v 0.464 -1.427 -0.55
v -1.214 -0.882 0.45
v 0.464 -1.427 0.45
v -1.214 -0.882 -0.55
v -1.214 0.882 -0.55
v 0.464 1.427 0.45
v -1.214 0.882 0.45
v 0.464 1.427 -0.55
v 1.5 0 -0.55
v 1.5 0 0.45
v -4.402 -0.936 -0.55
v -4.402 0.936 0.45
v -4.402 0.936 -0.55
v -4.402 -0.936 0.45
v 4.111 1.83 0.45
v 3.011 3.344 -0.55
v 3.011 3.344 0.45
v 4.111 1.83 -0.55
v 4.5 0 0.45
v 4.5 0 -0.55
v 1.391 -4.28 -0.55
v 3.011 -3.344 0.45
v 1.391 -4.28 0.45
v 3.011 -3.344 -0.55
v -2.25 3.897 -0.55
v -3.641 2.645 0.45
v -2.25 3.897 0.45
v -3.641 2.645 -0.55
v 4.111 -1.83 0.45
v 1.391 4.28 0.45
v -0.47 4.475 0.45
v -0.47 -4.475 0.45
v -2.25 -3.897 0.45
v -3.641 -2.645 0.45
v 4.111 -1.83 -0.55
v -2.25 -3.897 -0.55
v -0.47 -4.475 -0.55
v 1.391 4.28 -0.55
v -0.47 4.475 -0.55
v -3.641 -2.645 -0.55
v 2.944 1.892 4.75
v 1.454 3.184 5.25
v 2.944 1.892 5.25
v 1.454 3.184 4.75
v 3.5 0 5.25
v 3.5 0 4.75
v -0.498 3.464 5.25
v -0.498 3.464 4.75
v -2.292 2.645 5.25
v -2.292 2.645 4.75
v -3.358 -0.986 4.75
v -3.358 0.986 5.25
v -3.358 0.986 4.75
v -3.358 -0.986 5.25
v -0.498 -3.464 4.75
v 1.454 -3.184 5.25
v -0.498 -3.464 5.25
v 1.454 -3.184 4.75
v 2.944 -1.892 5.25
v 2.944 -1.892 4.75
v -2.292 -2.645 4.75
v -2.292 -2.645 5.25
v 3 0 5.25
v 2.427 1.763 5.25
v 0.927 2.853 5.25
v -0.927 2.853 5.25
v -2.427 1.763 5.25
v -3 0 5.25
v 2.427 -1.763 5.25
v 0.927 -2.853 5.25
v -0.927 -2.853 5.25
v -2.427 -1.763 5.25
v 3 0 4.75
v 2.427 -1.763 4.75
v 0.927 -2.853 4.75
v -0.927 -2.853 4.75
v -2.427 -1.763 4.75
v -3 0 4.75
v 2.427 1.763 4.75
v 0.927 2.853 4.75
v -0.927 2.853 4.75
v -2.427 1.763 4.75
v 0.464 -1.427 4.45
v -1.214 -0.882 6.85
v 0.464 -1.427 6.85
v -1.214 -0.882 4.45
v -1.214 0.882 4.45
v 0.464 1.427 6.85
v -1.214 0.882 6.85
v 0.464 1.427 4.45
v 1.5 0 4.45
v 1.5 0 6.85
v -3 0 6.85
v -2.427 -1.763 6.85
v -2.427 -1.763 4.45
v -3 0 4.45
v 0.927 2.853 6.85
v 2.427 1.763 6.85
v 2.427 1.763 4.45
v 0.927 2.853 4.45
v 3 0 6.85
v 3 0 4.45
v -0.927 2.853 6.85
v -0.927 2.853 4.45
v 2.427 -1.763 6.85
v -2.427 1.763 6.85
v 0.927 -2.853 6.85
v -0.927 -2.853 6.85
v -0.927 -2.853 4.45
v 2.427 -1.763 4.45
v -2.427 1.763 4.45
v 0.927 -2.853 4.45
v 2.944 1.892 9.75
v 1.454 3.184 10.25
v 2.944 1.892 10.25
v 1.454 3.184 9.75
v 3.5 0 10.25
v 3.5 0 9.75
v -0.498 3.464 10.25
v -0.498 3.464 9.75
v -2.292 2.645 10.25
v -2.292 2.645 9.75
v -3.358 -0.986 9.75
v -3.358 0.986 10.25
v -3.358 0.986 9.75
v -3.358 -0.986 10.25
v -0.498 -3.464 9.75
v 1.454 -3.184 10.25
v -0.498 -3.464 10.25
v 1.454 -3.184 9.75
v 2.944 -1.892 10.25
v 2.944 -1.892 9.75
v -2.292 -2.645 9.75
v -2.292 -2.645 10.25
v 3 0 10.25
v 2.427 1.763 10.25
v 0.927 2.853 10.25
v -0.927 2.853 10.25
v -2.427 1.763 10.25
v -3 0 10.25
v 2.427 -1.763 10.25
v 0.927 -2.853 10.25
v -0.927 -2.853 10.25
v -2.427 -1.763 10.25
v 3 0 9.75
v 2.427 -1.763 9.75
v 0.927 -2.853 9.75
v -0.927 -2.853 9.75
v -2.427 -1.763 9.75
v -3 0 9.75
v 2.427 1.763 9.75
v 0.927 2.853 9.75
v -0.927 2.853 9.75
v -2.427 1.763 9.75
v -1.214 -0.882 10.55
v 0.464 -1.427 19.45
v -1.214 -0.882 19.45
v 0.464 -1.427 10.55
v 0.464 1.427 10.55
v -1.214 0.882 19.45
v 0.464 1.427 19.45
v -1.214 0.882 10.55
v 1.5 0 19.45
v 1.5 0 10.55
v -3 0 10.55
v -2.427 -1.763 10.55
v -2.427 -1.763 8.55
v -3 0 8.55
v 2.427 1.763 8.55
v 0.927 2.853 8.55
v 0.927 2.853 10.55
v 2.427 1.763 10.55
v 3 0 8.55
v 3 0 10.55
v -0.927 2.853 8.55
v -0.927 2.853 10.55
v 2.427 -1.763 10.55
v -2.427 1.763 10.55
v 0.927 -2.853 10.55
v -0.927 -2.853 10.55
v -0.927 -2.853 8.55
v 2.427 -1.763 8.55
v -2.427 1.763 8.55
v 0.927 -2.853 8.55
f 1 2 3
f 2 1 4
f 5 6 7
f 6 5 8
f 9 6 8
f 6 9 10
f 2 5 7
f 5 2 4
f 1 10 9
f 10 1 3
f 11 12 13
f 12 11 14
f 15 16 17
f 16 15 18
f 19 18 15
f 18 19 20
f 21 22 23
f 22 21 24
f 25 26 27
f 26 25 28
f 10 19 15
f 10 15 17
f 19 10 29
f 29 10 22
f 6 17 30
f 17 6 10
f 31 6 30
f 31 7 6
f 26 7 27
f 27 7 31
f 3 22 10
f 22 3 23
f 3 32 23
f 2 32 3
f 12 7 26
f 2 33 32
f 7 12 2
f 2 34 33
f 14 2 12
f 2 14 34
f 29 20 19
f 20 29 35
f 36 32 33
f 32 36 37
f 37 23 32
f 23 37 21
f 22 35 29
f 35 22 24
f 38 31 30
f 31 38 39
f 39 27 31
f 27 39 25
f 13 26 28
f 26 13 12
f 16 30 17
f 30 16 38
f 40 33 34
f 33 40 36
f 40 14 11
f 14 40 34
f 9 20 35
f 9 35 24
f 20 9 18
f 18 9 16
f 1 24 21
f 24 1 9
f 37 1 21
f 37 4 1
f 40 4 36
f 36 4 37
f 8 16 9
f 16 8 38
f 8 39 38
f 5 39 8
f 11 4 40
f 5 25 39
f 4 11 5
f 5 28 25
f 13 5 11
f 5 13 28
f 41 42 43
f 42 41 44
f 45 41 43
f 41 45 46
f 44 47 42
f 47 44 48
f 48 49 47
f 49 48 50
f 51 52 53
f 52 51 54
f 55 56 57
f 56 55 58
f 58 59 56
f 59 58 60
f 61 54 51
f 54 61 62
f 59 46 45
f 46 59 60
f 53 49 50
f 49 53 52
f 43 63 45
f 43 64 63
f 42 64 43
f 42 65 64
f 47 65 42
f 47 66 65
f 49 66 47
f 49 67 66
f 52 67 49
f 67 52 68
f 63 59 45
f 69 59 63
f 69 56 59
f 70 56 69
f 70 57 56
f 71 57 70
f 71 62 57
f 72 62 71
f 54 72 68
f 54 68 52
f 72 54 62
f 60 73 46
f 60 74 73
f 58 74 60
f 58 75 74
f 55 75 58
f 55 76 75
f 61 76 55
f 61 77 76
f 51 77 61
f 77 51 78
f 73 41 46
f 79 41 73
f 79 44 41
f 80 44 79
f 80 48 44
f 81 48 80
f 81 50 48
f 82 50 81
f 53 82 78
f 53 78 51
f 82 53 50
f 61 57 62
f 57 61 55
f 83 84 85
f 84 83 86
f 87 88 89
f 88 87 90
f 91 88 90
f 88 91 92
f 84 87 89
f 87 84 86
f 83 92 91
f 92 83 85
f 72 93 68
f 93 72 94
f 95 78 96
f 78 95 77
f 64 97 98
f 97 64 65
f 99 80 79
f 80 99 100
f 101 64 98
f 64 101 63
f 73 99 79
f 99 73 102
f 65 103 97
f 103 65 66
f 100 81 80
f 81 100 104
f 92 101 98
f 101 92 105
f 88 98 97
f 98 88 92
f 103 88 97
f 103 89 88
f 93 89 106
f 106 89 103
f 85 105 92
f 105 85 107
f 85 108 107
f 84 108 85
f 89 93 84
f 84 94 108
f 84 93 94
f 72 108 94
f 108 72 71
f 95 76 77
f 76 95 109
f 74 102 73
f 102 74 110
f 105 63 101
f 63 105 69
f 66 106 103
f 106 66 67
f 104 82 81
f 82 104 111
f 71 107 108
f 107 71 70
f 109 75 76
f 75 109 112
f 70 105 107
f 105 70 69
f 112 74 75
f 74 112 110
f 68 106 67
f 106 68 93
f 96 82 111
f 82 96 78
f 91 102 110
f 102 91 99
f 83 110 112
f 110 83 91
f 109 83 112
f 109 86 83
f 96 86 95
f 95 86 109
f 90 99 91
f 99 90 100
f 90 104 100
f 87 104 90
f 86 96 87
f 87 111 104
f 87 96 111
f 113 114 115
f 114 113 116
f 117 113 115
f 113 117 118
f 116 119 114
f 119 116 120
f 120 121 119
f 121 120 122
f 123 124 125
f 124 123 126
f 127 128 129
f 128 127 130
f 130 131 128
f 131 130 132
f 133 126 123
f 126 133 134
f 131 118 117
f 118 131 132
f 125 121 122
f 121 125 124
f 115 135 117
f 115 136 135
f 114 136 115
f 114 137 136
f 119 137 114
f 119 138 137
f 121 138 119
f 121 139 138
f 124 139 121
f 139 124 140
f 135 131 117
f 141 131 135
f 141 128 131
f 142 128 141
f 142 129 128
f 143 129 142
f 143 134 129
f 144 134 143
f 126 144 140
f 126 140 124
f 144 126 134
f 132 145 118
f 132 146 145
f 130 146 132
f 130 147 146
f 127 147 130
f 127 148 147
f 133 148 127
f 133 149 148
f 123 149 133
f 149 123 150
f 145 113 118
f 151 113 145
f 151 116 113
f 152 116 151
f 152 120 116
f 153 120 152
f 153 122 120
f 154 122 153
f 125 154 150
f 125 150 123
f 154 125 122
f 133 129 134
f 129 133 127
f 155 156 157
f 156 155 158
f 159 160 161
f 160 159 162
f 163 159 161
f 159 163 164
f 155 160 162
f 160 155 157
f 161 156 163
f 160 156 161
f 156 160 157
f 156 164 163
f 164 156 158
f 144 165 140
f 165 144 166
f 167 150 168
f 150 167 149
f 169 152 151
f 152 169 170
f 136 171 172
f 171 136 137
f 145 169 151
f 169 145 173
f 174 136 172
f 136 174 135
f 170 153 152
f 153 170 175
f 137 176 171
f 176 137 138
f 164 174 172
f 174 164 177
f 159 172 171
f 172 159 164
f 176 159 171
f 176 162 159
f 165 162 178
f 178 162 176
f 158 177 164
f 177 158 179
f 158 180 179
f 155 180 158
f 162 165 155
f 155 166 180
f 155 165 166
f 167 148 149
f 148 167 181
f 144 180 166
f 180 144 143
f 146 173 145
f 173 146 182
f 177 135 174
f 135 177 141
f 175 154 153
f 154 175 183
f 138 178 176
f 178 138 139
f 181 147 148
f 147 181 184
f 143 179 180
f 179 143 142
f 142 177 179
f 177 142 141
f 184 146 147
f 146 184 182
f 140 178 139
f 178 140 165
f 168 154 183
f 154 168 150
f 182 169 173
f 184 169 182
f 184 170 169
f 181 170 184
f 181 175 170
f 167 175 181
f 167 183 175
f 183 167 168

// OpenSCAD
// Parameters
inner_diameter_mm = 3.0; //[1.5:6.0:0.1]
outer_diameter_mm = 7.0; //[3.5:14.0:0.1]
thickness_mm = 0.5; //[0.25:1.0:0.05]
inner_radius_mm = 1.5; //[0.75:3.0:0.05]
outer_radius_mm = 3.5; //[1.75:7.0:0.05]
overlap_mm = 0.8; //[0.5:2.0:0.1]
grommet_top_extra_radius_mm = 1.0; //[0.5:3.0:0.1]
grommet_top_height_mm = 1.0; //[0.5:4.0:0.1]
nut_flat_width_mm = 6.0; //[3.0:12.0:0.1]
nut_thickness_mm = 2.4; //[1.2:5.0:0.1]
screw_shank_diameter_mm = 3.0; //[1.5:6.0:0.1]
screw_shank_length_mm = 10.0; //[5.0:30.0:0.5]
screw_head_diameter_mm = 6.0; //[3.0:12.0:0.1]
screw_head_height_mm = 2.0; //[1.0:5.0:0.1]

// Washer - base geometry
module washer_body() {
  color("Silver") difference() {
    cylinder(r=outer_diameter_mm/2, h=thickness_mm, center=true);
    translate([0, 0, 0])
      cylinder(r=inner_diameter_mm/2, h=thickness_mm + 2*overlap_mm, center=true);
  }
}

// Round Grommet Top
module round_grommet_top() {
  color("DimGray") difference() {
    translate([0, 0, thickness_mm/2 + grommet_top_height_mm/2 - overlap_mm])
      cylinder(r=outer_diameter_mm/2 + grommet_top_extra_radius_mm, h=grommet_top_height_mm, center=true);
    translate([0, 0, thickness_mm/2 + grommet_top_height_mm/2 - overlap_mm])
      cylinder(r=inner_diameter_mm/2, h=grommet_top_height_mm + 2*overlap_mm, center=true);
  }
}

// Round Grommet Assembly
module round_grommet_assembly() {
  union() {
    washer_body();
    round_grommet_top();
  }
}

// Nut and Washer
module nut_and_washer() {
  color("Black") union() {
    washer_body();
    translate([0, 0, thickness_mm/2 + nut_thickness_mm/2 - overlap_mm])
      difference() {
        cylinder(r=nut_flat_width_mm/2, h=nut_thickness_mm, center=true);
        translate([0, 0, thickness_mm/2 + nut_thickness_mm/2 - overlap_mm])
          cylinder(r=inner_diameter_mm/2, h=nut_thickness_mm + 2*overlap_mm, center=true);
      }
  }
}

// Screw and Washer
module screw_and_washer() {
  color("SteelBlue") union() {
    washer_body();
    translate([0, 0, thickness_mm/2 + screw_shank_length_mm/2 - overlap_mm])
      cylinder(r=screw_shank_diameter_mm/2, h=screw_shank_length_mm, center=true);
    translate([0, 0, -thickness_mm/2 - screw_head_height_mm/2 + overlap_mm])
      cylinder(r=screw_head_diameter_mm/2, h=screw_head_height_mm, center=true);
  }
}

// Final Assembly
module assembly() {
  round_grommet_assembly();
  translate([0, 0, 5]) nut_and_washer();
  translate([0, 0, 10]) screw_and_washer();
}

assembly();
